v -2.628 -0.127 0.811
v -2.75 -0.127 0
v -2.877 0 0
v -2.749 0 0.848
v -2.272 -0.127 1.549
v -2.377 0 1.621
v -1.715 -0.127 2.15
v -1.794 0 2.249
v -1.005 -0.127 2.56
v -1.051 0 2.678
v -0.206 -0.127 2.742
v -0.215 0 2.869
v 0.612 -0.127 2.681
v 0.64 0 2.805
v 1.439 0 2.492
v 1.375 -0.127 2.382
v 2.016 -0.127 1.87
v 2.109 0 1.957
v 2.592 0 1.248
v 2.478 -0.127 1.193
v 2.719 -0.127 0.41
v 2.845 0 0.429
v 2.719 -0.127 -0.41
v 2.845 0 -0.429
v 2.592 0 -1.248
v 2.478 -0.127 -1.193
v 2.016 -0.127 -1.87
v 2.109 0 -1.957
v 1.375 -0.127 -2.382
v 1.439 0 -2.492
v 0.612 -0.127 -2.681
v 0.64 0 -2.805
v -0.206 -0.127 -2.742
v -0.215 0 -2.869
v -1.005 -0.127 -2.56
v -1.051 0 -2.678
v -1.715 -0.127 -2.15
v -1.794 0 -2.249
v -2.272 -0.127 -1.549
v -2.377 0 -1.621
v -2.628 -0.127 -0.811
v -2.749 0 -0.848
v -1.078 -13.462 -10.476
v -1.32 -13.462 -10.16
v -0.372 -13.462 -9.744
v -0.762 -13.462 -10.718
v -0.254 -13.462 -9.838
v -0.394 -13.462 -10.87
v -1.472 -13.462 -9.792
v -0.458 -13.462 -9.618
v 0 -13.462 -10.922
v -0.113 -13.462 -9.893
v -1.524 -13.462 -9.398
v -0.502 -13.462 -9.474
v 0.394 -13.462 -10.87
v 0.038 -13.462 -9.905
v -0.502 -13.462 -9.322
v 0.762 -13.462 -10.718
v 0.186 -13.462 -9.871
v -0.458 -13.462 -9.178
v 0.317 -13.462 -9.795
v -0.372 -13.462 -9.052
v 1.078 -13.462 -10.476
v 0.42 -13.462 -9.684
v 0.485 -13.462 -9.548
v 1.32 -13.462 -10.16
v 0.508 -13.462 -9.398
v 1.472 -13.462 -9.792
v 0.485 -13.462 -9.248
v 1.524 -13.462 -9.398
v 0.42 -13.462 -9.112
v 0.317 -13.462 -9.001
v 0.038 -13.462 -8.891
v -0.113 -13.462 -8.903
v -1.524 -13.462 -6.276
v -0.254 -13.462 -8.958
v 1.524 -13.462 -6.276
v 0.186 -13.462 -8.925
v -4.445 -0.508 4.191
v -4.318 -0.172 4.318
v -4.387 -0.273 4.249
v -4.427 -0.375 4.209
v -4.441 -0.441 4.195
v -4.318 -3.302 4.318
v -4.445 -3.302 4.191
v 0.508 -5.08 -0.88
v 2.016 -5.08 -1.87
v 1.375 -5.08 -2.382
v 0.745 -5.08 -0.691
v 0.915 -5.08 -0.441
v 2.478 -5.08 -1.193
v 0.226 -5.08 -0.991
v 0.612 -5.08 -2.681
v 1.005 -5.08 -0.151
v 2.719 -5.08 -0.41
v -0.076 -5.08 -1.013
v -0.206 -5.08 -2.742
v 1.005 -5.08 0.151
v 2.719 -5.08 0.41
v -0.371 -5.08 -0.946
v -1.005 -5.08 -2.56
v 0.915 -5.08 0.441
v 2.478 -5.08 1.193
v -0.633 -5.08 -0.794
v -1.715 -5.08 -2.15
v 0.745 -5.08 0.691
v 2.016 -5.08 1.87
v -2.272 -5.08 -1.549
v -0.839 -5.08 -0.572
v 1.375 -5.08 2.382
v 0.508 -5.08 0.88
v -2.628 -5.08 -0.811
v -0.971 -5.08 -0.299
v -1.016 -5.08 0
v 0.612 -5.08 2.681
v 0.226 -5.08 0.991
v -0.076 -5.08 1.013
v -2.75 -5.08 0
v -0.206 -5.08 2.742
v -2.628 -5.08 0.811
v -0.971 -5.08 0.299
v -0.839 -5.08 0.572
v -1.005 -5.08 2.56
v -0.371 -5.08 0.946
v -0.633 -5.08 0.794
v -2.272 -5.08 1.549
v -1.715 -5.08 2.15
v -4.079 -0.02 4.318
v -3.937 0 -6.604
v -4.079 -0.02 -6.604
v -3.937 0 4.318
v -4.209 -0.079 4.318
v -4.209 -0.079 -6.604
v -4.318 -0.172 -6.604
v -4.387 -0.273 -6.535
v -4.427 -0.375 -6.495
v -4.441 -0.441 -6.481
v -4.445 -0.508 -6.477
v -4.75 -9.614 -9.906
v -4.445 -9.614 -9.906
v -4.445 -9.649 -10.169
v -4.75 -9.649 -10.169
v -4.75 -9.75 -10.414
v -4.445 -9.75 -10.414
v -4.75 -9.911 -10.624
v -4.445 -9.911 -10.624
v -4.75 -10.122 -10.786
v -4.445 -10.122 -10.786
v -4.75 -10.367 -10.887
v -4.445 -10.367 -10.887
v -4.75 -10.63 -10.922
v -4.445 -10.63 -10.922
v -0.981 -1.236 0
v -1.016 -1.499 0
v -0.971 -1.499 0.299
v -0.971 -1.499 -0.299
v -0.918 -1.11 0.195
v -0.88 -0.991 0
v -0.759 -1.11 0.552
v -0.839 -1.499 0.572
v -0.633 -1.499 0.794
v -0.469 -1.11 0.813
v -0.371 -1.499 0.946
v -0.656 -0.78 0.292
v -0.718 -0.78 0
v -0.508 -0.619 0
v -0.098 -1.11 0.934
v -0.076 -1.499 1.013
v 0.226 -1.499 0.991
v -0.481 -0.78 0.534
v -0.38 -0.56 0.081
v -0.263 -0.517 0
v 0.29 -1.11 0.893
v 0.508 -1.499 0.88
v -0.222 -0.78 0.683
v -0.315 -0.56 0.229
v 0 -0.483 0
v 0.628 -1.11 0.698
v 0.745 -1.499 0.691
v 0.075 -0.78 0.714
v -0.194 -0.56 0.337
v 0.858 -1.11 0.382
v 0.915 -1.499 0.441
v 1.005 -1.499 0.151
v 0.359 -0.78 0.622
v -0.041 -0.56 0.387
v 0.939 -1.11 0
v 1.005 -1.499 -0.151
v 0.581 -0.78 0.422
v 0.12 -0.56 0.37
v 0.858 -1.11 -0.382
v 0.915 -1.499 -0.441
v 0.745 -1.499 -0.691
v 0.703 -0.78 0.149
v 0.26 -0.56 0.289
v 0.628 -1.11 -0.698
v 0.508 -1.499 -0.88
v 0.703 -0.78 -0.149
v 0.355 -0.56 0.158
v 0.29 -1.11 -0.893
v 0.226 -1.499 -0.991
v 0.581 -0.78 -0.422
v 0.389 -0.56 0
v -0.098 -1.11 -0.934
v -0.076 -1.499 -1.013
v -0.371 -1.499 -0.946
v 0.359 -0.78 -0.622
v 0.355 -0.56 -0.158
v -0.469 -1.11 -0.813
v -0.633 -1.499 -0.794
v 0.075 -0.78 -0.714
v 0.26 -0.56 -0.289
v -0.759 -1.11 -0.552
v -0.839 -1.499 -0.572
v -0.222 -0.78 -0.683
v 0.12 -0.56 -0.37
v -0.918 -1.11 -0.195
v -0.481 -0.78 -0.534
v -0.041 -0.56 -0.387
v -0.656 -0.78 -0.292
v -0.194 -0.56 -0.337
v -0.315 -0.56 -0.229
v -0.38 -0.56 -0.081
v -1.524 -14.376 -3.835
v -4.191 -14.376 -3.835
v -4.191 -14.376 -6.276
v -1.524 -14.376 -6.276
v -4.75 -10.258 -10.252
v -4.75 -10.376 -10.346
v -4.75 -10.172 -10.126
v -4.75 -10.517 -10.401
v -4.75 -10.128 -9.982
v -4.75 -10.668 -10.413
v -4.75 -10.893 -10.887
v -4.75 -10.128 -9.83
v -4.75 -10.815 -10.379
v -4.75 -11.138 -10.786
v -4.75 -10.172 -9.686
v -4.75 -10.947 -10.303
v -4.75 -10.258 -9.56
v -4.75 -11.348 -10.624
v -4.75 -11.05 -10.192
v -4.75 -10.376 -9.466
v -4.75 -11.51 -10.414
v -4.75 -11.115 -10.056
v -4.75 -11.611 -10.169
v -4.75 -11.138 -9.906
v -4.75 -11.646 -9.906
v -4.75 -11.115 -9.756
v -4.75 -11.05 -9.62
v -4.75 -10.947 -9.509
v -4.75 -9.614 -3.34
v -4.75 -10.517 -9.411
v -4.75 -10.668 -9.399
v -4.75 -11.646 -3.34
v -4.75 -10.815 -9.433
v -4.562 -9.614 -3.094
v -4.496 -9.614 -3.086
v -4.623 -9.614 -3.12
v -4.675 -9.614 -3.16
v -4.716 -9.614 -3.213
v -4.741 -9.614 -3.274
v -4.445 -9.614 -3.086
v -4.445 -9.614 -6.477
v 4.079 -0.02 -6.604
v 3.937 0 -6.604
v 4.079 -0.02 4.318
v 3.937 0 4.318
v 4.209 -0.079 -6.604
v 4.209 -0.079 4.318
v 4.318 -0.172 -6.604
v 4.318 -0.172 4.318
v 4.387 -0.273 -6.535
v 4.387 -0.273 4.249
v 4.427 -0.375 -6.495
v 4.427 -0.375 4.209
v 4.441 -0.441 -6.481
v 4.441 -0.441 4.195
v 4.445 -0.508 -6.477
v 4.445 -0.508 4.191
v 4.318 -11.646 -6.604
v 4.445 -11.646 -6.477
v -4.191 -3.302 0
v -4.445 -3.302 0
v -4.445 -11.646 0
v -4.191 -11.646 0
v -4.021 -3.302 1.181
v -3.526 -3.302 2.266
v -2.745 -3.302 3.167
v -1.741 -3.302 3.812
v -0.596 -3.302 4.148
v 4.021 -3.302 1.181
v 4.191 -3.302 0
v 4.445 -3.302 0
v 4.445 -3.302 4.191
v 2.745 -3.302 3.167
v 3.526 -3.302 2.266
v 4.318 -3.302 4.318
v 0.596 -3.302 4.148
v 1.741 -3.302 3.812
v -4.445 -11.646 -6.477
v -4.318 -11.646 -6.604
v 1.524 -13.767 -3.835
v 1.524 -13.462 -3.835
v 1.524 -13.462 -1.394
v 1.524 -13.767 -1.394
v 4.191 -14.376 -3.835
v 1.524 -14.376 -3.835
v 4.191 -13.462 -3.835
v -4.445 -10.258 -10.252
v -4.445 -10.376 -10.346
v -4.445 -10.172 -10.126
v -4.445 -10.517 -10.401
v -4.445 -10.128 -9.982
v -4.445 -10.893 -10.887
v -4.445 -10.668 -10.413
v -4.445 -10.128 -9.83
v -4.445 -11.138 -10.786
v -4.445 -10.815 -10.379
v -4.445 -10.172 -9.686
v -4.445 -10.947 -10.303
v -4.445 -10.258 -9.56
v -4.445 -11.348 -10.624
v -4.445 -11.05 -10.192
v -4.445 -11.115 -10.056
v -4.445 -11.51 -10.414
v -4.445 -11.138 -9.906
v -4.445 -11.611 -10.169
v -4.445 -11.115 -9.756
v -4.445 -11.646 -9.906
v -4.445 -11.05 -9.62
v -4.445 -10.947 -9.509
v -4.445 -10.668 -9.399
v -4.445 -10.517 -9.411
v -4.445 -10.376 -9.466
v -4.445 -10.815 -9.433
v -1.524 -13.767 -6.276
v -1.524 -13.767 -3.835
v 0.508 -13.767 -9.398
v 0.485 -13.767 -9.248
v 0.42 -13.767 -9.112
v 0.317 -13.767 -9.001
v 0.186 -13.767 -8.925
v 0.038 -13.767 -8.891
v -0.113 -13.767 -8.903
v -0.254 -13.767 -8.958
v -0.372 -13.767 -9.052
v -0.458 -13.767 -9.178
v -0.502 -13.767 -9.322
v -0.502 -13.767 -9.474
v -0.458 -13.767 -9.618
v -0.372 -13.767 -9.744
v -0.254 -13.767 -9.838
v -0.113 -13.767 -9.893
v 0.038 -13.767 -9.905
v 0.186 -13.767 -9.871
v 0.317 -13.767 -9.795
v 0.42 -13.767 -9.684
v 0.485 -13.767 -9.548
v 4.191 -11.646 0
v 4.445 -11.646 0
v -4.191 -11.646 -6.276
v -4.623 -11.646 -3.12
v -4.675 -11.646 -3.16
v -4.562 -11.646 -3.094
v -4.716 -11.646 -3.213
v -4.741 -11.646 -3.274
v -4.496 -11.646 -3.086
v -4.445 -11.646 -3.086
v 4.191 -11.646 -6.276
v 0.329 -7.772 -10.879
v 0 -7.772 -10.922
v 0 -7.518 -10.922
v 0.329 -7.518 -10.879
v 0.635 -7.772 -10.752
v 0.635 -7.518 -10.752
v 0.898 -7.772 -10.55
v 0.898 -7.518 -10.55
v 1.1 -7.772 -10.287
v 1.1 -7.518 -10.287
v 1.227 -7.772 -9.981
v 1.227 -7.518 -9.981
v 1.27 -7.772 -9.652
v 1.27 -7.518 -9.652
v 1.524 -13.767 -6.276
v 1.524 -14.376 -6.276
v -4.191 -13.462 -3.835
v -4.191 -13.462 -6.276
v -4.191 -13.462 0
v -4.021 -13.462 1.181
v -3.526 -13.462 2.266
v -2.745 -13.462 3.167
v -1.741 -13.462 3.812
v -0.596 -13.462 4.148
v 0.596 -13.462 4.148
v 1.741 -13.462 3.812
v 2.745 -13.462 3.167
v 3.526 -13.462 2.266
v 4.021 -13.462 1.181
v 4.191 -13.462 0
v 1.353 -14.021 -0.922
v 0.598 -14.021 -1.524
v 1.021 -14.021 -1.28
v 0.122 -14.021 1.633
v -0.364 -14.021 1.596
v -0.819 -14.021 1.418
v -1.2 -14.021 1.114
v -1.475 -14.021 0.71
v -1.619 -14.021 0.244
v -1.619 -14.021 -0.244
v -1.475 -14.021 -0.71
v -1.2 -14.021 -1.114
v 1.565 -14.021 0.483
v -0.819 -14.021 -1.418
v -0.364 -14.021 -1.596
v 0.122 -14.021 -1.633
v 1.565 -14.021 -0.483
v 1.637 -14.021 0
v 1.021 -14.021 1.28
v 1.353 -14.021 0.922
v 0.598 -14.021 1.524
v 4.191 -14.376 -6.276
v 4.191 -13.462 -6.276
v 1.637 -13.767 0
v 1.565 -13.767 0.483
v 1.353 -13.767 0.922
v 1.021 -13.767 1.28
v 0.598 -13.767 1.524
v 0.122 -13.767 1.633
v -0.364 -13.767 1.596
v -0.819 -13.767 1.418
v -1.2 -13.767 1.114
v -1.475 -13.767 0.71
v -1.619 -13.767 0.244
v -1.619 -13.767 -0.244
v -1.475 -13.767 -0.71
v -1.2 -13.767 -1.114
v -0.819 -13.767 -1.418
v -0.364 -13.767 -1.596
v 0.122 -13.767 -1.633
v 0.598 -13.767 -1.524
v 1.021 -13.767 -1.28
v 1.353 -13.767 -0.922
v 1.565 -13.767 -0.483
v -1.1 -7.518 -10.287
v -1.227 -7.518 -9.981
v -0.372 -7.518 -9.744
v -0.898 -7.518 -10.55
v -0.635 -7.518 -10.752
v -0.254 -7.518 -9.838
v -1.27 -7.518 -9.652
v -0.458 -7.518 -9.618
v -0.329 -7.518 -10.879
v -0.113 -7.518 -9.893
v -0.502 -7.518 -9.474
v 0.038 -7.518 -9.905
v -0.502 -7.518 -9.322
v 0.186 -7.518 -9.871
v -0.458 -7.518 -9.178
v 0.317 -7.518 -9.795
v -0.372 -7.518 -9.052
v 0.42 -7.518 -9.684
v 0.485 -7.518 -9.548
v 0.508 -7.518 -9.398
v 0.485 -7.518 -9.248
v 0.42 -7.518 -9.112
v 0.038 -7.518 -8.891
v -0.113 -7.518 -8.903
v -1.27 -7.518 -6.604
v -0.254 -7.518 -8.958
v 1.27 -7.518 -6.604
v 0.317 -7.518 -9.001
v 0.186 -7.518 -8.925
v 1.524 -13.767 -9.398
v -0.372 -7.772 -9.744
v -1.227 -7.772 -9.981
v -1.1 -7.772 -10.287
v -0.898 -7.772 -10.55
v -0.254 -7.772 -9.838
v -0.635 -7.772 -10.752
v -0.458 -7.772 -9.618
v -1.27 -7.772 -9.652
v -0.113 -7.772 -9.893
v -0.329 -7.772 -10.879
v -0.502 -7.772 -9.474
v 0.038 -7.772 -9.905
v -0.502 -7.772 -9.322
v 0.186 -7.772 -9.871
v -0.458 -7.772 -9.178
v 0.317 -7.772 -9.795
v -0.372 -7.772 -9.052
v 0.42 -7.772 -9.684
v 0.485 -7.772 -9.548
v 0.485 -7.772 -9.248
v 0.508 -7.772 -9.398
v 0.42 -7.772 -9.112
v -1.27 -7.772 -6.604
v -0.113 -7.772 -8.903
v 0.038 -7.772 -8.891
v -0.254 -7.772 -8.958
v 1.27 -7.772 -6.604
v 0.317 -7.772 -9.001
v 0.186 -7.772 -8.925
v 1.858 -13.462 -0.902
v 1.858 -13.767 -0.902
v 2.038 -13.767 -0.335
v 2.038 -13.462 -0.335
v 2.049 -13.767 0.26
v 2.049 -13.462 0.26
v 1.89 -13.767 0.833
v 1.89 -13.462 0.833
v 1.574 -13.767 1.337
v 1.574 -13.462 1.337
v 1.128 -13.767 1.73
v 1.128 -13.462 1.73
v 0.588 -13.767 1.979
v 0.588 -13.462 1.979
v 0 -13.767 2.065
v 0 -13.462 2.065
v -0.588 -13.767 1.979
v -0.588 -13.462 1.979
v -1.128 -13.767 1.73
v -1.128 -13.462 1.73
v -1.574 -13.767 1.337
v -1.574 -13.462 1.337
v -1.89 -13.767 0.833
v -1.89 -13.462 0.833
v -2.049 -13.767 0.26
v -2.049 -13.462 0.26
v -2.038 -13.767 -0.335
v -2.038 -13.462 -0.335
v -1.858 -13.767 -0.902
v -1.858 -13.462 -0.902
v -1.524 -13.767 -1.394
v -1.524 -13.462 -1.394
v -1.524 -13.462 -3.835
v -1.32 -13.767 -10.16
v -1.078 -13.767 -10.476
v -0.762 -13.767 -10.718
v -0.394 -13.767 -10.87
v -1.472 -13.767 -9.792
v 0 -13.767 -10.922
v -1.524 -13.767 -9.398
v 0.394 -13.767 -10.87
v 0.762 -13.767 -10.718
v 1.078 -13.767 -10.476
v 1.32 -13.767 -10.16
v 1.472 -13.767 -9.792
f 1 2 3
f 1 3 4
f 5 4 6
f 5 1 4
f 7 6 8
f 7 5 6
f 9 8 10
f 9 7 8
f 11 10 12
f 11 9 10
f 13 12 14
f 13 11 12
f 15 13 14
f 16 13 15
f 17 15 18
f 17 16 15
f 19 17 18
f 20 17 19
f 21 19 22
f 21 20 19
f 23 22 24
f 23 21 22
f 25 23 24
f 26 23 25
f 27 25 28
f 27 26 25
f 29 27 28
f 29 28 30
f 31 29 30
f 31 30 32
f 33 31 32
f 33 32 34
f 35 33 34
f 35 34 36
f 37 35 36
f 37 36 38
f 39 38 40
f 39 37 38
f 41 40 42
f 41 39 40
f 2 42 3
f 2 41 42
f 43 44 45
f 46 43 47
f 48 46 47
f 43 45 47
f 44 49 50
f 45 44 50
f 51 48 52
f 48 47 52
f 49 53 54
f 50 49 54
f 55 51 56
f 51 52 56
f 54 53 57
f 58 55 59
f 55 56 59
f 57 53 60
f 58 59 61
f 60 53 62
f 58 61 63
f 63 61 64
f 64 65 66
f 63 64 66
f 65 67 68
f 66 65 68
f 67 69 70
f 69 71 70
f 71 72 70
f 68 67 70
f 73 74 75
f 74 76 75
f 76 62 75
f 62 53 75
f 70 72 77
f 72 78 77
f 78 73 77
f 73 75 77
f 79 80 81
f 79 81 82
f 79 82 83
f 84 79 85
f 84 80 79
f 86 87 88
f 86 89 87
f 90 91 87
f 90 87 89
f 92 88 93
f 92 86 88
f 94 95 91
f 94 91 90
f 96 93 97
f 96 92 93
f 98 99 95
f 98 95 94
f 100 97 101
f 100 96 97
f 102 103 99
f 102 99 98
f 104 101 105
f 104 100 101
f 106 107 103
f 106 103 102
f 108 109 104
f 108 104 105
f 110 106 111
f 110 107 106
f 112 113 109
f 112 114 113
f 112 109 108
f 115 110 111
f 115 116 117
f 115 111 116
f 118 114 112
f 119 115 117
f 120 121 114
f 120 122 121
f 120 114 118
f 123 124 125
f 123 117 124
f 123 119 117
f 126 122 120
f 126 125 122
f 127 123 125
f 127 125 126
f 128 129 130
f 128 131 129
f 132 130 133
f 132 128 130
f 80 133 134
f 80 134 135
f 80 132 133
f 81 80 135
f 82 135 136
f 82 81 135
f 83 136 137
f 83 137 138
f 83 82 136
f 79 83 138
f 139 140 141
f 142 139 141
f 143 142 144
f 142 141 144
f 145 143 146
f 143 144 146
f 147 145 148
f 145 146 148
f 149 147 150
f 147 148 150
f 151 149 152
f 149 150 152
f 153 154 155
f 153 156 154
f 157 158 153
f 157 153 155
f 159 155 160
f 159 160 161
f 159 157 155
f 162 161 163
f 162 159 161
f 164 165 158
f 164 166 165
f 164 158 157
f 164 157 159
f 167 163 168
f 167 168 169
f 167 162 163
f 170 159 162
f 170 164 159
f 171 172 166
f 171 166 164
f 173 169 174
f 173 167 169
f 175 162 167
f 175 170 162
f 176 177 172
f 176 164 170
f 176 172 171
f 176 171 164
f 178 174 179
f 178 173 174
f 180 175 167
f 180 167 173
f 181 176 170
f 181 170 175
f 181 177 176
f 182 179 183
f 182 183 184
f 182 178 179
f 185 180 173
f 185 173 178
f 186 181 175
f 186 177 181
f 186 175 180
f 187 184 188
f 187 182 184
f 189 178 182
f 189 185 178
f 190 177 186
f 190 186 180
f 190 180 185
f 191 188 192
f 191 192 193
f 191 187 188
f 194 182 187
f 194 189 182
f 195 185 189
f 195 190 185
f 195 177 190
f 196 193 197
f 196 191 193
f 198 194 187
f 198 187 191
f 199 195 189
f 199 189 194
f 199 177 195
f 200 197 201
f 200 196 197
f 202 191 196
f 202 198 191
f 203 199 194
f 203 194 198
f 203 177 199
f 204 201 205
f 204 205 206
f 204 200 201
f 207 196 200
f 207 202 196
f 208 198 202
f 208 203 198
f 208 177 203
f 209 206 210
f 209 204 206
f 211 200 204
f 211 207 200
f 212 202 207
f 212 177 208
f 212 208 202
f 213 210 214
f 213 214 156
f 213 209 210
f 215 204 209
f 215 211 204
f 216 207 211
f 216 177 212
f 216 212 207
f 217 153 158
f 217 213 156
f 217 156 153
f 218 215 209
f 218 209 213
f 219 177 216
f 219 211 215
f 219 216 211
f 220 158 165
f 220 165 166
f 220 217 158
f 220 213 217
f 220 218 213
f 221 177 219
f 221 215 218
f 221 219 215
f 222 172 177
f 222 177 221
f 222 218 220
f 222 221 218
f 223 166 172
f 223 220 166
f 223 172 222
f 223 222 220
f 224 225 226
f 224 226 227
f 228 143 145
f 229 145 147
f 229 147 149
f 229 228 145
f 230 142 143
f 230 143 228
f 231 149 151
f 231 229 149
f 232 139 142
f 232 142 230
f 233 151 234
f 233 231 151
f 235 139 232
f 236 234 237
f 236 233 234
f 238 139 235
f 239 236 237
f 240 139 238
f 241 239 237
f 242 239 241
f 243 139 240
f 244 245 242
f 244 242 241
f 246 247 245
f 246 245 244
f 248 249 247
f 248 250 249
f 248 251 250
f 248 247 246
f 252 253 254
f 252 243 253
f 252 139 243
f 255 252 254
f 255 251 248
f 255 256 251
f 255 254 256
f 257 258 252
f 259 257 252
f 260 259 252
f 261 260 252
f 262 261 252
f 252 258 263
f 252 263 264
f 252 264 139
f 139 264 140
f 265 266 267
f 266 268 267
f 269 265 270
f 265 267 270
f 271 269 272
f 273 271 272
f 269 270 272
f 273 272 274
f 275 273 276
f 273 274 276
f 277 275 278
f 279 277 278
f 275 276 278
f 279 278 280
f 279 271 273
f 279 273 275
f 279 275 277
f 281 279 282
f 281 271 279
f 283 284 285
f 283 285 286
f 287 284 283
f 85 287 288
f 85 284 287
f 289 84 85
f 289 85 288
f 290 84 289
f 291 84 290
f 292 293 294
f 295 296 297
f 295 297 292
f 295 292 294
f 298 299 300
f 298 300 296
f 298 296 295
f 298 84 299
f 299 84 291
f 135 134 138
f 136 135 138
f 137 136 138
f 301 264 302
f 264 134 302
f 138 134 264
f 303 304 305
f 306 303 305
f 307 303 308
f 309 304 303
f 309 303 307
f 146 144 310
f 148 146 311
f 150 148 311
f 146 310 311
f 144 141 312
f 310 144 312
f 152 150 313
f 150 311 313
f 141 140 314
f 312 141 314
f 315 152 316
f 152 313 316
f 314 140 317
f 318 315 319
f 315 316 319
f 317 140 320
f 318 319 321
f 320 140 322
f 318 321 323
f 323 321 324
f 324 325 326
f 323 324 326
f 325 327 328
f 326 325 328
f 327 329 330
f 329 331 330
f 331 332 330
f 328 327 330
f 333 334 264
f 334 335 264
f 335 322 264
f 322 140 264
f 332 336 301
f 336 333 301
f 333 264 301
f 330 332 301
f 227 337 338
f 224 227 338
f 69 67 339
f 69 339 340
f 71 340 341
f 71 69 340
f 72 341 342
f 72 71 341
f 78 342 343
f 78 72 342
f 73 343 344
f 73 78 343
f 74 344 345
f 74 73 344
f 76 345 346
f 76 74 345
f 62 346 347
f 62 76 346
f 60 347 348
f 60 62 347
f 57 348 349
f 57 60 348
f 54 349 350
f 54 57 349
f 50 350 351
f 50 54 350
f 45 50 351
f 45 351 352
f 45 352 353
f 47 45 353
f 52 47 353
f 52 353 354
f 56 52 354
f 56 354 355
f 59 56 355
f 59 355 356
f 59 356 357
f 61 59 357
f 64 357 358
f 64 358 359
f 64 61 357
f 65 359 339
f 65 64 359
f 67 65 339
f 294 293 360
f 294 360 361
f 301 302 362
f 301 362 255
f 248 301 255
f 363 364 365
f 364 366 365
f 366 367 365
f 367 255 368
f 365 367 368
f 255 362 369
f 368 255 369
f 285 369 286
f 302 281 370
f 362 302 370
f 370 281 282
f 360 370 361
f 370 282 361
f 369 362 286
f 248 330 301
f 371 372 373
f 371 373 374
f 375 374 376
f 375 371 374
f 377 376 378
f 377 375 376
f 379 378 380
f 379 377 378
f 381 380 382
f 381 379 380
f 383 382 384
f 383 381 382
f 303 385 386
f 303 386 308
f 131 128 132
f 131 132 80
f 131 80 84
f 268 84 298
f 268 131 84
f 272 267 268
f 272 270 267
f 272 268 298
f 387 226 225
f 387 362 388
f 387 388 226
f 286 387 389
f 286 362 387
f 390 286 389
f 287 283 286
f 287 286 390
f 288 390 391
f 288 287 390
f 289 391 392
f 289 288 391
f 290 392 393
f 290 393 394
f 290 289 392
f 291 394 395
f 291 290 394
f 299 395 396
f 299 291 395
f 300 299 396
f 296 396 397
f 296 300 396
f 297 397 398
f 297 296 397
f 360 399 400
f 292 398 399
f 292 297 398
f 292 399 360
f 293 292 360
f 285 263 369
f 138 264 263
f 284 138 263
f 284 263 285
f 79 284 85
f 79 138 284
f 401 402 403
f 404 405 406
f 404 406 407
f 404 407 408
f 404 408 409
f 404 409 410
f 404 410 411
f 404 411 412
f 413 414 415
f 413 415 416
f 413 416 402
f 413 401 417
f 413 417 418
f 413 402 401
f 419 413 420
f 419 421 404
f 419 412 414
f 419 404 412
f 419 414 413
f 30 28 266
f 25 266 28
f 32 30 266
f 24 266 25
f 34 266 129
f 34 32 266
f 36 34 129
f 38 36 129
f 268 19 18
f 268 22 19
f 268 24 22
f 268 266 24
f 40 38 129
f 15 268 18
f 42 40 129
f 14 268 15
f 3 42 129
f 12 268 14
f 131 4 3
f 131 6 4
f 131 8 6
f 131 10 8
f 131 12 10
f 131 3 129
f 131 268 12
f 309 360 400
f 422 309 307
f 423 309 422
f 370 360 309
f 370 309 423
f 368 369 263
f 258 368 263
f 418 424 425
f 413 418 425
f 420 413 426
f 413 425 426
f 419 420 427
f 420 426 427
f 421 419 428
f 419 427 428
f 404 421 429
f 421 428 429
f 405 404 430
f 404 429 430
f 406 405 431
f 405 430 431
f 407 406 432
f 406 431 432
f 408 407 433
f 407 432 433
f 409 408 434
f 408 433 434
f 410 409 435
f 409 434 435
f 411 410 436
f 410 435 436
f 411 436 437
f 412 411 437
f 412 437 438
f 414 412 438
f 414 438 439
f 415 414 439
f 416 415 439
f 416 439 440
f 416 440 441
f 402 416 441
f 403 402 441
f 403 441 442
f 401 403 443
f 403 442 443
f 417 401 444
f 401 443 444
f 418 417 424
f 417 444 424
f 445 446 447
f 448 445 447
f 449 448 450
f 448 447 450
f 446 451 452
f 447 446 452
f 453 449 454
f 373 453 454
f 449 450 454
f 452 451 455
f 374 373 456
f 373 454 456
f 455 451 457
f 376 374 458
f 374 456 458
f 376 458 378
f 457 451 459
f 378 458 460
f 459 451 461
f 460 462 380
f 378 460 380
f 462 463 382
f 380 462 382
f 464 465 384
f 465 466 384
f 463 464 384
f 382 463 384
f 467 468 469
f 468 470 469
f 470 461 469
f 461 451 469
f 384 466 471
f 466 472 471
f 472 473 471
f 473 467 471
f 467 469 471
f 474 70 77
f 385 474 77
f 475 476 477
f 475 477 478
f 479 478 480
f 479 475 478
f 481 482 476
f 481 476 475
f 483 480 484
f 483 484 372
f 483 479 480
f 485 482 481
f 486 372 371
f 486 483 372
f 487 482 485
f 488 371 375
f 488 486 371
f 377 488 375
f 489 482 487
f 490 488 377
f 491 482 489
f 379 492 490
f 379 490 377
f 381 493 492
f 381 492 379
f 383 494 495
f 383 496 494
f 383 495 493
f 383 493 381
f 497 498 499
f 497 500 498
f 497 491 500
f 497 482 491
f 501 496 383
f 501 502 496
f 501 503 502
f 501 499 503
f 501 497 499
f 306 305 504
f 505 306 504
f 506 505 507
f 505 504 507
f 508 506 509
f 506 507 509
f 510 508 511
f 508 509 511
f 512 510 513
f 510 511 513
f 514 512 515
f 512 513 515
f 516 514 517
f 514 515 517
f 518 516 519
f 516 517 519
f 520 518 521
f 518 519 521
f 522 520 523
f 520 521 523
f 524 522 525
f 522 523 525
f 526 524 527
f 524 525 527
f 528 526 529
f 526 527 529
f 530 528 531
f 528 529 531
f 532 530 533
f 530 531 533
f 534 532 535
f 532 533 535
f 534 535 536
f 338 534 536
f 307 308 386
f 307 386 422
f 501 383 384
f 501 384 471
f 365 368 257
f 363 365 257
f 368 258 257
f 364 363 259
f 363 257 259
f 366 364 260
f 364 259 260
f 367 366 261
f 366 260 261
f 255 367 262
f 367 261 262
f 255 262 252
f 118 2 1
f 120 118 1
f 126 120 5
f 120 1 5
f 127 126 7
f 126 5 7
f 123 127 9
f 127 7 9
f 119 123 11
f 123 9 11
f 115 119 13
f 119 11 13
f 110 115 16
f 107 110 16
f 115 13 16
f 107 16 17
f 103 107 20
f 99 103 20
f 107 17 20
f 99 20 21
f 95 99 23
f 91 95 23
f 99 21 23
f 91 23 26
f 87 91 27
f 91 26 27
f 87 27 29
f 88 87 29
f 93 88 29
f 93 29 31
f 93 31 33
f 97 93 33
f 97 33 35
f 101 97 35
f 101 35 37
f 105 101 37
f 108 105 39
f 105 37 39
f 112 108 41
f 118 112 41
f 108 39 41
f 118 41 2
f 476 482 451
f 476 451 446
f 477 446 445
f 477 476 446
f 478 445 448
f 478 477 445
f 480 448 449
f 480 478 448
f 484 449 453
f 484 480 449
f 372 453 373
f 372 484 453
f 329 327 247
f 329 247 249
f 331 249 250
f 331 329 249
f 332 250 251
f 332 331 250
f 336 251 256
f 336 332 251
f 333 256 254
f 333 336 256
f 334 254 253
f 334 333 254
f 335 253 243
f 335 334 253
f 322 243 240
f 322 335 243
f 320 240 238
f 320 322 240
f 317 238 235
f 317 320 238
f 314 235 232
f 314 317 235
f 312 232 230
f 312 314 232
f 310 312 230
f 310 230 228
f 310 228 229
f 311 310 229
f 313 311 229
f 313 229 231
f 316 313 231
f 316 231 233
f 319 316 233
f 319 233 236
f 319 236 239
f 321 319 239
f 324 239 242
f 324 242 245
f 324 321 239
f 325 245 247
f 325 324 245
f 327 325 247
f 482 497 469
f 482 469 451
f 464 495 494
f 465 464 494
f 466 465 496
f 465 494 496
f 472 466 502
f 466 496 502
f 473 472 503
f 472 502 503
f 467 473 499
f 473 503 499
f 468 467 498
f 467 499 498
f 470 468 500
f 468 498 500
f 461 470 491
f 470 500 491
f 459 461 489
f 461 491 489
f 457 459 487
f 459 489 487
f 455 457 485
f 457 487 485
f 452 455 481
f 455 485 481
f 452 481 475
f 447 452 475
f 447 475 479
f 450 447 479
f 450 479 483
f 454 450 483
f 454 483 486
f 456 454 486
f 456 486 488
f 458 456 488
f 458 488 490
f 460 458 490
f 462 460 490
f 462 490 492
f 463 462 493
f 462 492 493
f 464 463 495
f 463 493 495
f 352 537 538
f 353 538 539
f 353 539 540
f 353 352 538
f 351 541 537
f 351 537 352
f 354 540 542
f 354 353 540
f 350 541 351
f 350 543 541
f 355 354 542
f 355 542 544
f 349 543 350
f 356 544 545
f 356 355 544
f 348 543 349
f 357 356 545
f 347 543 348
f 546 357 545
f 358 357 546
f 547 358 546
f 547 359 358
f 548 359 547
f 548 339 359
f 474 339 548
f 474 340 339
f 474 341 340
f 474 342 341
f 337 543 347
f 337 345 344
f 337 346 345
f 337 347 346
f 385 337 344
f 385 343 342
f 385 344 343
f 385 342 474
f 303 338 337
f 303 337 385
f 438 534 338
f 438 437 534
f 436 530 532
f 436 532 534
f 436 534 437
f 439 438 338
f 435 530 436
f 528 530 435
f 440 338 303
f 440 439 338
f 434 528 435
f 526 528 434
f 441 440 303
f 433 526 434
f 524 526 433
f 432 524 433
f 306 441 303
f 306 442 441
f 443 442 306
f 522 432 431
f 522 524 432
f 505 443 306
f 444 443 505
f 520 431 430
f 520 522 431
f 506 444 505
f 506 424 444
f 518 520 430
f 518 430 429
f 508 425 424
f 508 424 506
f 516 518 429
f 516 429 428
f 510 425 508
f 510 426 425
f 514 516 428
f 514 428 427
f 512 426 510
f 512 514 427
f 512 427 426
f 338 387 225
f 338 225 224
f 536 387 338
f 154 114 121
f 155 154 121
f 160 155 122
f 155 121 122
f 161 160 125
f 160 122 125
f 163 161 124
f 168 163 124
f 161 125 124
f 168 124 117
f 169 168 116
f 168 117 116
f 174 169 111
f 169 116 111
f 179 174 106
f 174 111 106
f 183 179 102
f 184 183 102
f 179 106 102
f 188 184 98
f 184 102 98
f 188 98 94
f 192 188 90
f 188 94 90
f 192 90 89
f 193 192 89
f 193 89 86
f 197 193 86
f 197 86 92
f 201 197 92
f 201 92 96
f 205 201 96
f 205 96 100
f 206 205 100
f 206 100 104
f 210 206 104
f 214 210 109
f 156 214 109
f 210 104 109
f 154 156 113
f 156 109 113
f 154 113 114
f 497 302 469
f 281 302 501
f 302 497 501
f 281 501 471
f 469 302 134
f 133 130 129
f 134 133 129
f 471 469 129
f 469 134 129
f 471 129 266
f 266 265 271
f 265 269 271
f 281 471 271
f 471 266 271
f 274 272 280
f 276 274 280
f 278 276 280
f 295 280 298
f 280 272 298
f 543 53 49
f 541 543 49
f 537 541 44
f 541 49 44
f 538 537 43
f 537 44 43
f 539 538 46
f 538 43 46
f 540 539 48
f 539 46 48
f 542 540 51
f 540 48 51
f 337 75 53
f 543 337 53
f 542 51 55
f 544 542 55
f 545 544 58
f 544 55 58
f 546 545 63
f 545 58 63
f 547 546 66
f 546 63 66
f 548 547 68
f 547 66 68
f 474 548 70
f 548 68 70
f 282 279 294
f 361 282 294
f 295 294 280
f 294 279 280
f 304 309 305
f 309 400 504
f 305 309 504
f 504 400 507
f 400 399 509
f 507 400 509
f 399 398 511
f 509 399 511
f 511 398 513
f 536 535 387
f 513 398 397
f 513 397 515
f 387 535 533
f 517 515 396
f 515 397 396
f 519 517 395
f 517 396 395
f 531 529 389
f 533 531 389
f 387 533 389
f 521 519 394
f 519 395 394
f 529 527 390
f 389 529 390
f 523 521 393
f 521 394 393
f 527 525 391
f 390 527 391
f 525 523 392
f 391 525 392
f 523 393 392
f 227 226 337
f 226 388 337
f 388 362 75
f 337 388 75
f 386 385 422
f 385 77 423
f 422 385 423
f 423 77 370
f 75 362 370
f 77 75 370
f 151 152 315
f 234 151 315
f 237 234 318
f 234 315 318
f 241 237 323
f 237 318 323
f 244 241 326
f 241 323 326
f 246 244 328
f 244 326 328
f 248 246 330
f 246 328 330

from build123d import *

# Parameters (mm, degrees)
F0_W      = 8.89
F0_H      = 10.922
F1_DEPTH  = 3.302
F3_DEPTH  = 13.462
F4_R      = 0.508
F4_R_2    = 1.6374420612
F5_DEPTH  = 0.3048
F6_R      = 1.6374420612
F7_DEPTH  = 0.254
F8_W      = 8.89
F8_H      = 6.604
F9_DEPTH  = 8.3439
F10_W     = 2.667
F10_H     = 2.4411697693
F11_DEPTH = 0.3048
F12_W     = 2.667
F12_H     = 2.4411697693
F13_DEPTH = 0.6096
F14_R     = 2.75
F15_DEPTH = 5.08
F16_SIZE  = 0.127
F18_R     = 0.508
F19_DEPTH = 0.254
F20_R     = 0.508
F21_DEPTH = 0.3048
F22_R     = 0.254
F23_R     = 1.016
F24_DEPTH = 4.5974
F25_R     = 1.016
F26_R     = 0.508


with BuildPart() as f1:
    # F0 (on Front) → F1 (new body)
    with BuildSketch(Plane.XZ):
        with Locations((0, -1.143)):
            Rectangle(F0_W, F0_H)
    extrude(amount=F1_DEPTH)

    # F2 (on face) → F3 (join)
    with BuildSketch(Plane(origin=(0, 0, 0), x_dir=(-1, 0, 0), z_dir=(0, 1, 0))):
        with BuildLine():
            ThreePointArc((4.191, 0), (0, 4.191), (-4.191, 0))
            Line((-4.191, 0), (-4.191, -6.2759071589))
            Line((-4.191, -6.2759071589), (4.191, -6.2759071589))
            Line((4.191, -6.2759071589), (4.191, 0))
        make_face()
    extrude(amount=-F3_DEPTH)

    # F4 (on face) → F5 (join)
    with BuildSketch(Plane.XZ.offset(13.462)):
        with BuildLine():
            Line((1.524, -9.398), (1.524, -1.3935676202))
            ThreePointArc((1.524, -1.3935676202), (0, 2.0650924222), (-1.524, -1.3935676202))
            Line((-1.524, -1.3935676202), (-1.524, -9.398))
            ThreePointArc((-1.524, -9.398), (-1.0776307345, -10.4756307345), (0, -10.922))
            ThreePointArc((0, -10.922), (1.0776307345, -10.4756307345), (1.524, -9.398))
        make_face()
        with Locations((0, -9.398)):
            Circle(F4_R, mode=Mode.SUBTRACT)
        Circle(F4_R_2, mode=Mode.SUBTRACT)
        Circle(F4_R_2)
    extrude(amount=F5_DEPTH)

    # F6 (on face) → F7 (join)
    with BuildSketch(Plane.XZ.offset(13.7668)):
        Circle(F6_R)
    extrude(amount=F7_DEPTH)

    # F8 (on face) → F9 (join)
    with BuildSketch(Plane.XZ.offset(3.302)):
        with Locations((0, -3.302)):
            Rectangle(F8_W, F8_H)
    extrude(amount=F9_DEPTH)

    # F10 (on face) → F11 (join, through all)
    with BuildSketch(Plane.XZ.offset(13.462)):
        with Locations((-2.8575, -5.0553222742)):
            Rectangle(F10_W, F10_H)
        with Locations((2.8575, -5.0553222742)):
            Rectangle(F10_W, F10_H)
    extrude(amount=F11_DEPTH)

    # F12 (on face) → F13 (join)
    with BuildSketch(Plane.XZ.offset(13.7668)):
        with Locations((-2.8575, -5.0553222742)):
            Rectangle(F12_W, F12_H)
        with Locations((2.8575, -5.0553222742)):
            Rectangle(F12_W, F12_H)
    extrude(amount=F13_DEPTH)

    # F14 (on face) → F15 (cut)
    with BuildSketch(Plane(origin=(0, 0, 0), x_dir=(-1, 0, 0), z_dir=(0, 1, 0))):
        Circle(F14_R)
    extrude(amount=-F15_DEPTH, mode=Mode.SUBTRACT)

    # F16
    f16_edges = [f1.edges().sort_by_distance(p)[0] for p in [
        (-4.445, -1.651, 4.318),
        (4.445, -1.651, 4.318),
        (4.445, -5.82295, -6.604),
        (-4.445, -5.82295, -6.604),
        (2.75, 0, 0),
    ]]
    chamfer(f16_edges, length=F16_SIZE)

    # F18 (on offset) → F19 (join)
    with BuildSketch(Plane.XZ.offset(7.7724)):
        with BuildLine():
            Line((1.27, -6.604), (-1.27, -6.604))
            Line((-1.27, -6.604), (-1.27, -9.652))
            ThreePointArc((-1.27, -9.652), (-0.8980256121, -10.5500256121), (0, -10.922))
            ThreePointArc((0, -10.922), (0.8980256121, -10.5500256121), (1.27, -9.652))
            Line((1.27, -9.652), (1.27, -6.604))
        make_face()
        with Locations((0, -9.398)):
            Circle(F18_R, mode=Mode.SUBTRACT)
    extrude(amount=-F19_DEPTH)

    # F20 (on face) → F21 (join)
    with BuildSketch(Plane(origin=(-4.445, 0, 0), x_dir=(0, -1, 0), z_dir=(-1, 0, 0))):
        with BuildLine():
            Line((11.6459, -3.0857360969), (9.6139, -3.0857360969))
            Line((9.6139, -3.0857360969), (9.6139, -9.906))
            ThreePointArc((9.6139, -9.906), (9.9114795103, -10.6244204897), (10.6299, -10.922))
            ThreePointArc((10.6299, -10.922), (11.3483204897, -10.6244204897), (11.6459, -9.906))
            Line((11.6459, -9.906), (11.6459, -3.0857360969))
        make_face()
        with Locations((10.6299, -9.906)):
            Circle(F20_R, mode=Mode.SUBTRACT)
    extrude(amount=F21_DEPTH)

    # F22
    f22_edges = [f1.edges().sort_by_distance(p)[0] for p in [
        (-4.7498, -10.6299, -3.085736),
    ]]
    fillet(f22_edges, radius=F22_R)

    # F23 (on face) → F24 (join)
    with BuildSketch(Plane(origin=(0, -5.08, 0), x_dir=(-1, 0, 0), z_dir=(0, 1, 0))):
        Circle(F23_R)
    extrude(amount=F24_DEPTH)

    # F25
    f25_edges = [f1.edges().sort_by_distance(p)[0] for p in [
        (1.016, -0.4826, 0),
    ]]
    fillet(f25_edges, radius=F25_R)

    # F26
    f26_edges = [f1.edges().sort_by_distance(p)[0] for p in [
        (-4.445, 0, -1.143),
        (4.445, 0, -1.143),
    ]]
    fillet(f26_edges, radius=F26_R)


solid = f1.part
